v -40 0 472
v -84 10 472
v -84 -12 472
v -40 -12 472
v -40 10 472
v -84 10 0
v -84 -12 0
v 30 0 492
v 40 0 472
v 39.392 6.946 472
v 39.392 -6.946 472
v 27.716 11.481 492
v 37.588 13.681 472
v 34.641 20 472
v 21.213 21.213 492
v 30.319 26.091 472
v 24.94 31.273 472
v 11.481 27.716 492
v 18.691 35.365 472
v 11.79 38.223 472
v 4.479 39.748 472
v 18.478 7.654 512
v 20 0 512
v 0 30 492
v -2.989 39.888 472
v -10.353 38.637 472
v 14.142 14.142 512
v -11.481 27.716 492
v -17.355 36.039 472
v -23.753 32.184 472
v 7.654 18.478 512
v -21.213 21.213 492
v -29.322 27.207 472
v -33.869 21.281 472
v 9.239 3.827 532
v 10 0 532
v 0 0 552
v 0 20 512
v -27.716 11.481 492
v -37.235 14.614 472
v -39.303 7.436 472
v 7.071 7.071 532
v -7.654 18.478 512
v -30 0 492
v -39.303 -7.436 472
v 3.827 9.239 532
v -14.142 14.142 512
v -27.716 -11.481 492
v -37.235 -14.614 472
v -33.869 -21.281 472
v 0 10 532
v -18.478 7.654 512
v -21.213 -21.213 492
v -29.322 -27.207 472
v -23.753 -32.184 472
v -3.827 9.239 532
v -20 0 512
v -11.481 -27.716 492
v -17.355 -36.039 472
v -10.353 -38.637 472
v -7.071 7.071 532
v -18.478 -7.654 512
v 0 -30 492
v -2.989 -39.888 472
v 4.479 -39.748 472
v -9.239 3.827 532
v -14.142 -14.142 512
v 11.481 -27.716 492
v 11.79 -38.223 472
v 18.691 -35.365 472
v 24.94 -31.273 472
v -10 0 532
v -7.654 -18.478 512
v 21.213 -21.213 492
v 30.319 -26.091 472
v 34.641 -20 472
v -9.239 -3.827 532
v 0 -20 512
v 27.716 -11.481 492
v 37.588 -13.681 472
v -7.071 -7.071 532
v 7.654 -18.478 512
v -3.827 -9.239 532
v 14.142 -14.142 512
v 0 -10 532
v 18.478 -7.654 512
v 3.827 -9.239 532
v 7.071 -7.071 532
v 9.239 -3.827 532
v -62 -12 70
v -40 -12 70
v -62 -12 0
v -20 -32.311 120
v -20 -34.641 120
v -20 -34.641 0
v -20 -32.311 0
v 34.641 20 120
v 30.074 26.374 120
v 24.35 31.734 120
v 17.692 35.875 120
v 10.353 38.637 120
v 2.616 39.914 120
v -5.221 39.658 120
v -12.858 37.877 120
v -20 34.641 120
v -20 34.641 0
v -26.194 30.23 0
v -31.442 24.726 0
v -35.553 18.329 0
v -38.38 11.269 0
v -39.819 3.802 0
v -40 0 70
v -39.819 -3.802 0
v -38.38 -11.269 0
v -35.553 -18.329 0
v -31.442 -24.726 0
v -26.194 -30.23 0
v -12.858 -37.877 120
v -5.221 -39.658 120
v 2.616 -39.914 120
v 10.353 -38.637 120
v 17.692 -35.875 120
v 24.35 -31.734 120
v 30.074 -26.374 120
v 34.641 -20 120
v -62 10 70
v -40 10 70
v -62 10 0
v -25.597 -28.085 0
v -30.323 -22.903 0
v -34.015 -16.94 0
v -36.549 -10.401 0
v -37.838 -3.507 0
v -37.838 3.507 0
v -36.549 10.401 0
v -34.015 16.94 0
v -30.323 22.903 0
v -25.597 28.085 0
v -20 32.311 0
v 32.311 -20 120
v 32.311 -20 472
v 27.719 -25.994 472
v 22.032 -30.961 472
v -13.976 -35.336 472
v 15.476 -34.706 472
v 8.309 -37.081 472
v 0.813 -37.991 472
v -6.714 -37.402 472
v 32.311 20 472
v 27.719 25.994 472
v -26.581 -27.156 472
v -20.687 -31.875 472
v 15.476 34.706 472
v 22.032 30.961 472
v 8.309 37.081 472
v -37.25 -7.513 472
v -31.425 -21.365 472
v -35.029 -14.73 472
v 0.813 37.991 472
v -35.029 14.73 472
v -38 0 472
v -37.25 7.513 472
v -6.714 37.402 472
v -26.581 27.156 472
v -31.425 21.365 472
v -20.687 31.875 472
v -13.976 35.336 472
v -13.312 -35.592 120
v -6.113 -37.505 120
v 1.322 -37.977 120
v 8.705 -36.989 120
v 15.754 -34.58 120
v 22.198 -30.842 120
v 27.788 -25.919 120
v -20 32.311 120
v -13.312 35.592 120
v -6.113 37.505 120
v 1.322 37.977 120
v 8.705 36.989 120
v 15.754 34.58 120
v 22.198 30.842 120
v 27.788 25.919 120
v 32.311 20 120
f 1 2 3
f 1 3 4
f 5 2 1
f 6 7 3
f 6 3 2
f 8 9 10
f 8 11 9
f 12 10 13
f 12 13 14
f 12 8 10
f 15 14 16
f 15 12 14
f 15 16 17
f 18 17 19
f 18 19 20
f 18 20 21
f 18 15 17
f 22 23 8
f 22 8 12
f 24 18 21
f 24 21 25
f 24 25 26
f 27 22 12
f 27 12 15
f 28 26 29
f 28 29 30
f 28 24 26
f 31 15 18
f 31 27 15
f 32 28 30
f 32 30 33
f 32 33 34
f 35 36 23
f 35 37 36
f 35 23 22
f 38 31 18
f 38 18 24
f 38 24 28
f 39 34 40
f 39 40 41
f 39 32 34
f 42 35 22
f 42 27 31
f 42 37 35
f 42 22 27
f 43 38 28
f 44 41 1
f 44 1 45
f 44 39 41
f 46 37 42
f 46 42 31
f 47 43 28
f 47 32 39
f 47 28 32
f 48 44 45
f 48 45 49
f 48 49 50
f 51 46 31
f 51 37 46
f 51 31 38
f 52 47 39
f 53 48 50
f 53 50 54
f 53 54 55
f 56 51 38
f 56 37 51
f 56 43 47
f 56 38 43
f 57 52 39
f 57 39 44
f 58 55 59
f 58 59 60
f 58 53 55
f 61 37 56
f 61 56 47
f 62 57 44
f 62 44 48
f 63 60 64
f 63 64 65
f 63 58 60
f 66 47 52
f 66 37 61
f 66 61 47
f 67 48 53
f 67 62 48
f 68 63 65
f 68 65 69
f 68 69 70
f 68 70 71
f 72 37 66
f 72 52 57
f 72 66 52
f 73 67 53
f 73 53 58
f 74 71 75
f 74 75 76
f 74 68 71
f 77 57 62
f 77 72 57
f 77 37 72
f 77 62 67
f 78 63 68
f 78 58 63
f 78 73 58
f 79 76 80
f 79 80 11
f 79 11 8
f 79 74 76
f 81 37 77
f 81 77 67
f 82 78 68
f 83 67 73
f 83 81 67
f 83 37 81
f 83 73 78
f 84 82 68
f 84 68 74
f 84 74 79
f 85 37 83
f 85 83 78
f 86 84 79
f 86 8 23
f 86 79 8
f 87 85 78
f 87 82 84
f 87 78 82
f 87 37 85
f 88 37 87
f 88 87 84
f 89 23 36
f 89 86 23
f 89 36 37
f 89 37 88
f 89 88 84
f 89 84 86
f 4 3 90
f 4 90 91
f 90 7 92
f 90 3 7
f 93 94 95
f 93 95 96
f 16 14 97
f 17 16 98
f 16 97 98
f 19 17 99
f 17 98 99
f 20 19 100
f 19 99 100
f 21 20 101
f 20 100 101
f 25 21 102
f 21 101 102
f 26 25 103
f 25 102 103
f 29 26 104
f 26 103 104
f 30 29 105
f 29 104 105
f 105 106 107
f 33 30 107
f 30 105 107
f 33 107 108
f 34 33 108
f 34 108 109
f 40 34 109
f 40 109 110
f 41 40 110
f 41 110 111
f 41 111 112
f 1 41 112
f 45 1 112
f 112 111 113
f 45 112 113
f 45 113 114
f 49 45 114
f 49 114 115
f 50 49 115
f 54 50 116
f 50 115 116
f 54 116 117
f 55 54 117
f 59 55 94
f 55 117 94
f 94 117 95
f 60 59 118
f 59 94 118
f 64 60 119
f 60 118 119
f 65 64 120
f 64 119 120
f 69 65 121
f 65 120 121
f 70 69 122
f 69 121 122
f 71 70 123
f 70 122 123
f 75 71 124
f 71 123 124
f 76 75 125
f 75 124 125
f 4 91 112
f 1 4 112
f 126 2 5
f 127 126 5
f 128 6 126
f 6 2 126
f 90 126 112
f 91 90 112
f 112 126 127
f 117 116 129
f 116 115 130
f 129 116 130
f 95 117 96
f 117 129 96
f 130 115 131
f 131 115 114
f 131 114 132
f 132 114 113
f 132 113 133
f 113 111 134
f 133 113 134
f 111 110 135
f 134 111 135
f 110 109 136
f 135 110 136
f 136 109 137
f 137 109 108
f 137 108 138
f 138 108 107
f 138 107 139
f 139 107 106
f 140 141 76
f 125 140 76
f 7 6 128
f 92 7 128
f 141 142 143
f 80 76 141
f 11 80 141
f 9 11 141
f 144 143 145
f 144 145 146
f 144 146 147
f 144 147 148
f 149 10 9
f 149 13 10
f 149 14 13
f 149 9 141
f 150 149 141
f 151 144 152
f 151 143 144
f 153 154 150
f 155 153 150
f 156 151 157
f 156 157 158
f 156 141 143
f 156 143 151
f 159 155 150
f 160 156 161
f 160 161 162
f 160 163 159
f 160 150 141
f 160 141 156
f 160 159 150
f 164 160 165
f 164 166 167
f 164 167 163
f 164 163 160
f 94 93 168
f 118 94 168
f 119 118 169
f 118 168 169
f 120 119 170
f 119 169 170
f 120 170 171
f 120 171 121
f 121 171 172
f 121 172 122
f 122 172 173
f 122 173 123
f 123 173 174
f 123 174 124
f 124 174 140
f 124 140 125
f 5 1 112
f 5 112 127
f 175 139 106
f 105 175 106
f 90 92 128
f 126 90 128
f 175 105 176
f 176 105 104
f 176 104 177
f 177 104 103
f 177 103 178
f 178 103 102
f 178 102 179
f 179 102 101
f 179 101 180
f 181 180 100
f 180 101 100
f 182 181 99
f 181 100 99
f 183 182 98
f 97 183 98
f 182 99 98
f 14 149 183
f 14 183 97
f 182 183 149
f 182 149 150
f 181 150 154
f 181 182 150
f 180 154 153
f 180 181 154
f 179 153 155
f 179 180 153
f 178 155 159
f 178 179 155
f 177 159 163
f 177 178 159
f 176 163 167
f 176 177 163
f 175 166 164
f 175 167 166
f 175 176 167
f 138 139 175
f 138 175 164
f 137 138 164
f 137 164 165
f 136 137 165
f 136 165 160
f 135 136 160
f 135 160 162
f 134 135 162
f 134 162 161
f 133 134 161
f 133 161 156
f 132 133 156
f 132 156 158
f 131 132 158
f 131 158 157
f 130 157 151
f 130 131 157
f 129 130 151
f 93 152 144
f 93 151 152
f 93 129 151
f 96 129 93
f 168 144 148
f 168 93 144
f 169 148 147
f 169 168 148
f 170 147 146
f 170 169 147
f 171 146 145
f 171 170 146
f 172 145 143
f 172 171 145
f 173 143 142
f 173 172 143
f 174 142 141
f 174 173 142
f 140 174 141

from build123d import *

# Parameters (mm, degrees)
BOX003_W          = 22
BOX003_H          = 60
BOX003_DEPTH      = 70
BOX002_W          = 44
BOX002_H          = 22
BOX002_DEPTH      = 472
BOX001_W          = 60
BOX001_H          = 40
BOX001_DEPTH      = 472
BOX_W             = 100
BOX_H             = 100
BOX_DEPTH         = 120
CYLINDER001_R     = 38
CYLINDER001_DEPTH = 500
CYLINDER_R        = 40
CYLINDER_DEPTH    = 472


with BuildPart() as rocket_cap:
    # Cone → Cone (revolve)
    with BuildSketch(Plane(origin=(0, 0, 472), x_dir=(1, 0, 0), z_dir=(0, -1, 0))):
        Polygon((0, 0), (40, 0), (0, 80), align=None)
    revolve(axis=Axis((0, 0, 472), (0, 0, 1)))


with BuildPart() as holder_opening:
    # Box003 → Box003 (new body)
    with BuildSketch(Plane(origin=(-62, -30, 0), x_dir=(1, 0, 0), z_dir=(0, 0, 1))):
        with Locations((11, 30)):
            Rectangle(BOX003_W, BOX003_H)
    extrude(amount=BOX003_DEPTH)


with BuildPart() as holder_final:
    # Box002 → Box002 (new body)
    with BuildSketch(Plane(origin=(-84, -12, 0), x_dir=(1, 0, 0), z_dir=(0, 0, 1))):
        with Locations((22, 11)):
            Rectangle(BOX002_W, BOX002_H)
    extrude(amount=BOX002_DEPTH)

    # Cut002: cut holder_opening
    add(holder_opening.part, mode=Mode.SUBTRACT)


with BuildPart() as opening2:
    # Box001 → Box001 (new body)
    with BuildSketch(Plane(origin=(0, -20, 0), x_dir=(1, 0, 0), z_dir=(0, 0, 1))):
        with Locations((30, 20)):
            Rectangle(BOX001_W, BOX001_H)
    extrude(amount=BOX001_DEPTH)


with BuildPart() as opening_final:
    # Box → Box (new body)
    with BuildSketch(Plane(origin=(-20, -50, 0), x_dir=(1, 0, 0), z_dir=(0, 0, 1))):
        with Locations((50, 50)):
            Rectangle(BOX_W, BOX_H)
    extrude(amount=BOX_DEPTH)

    # Fusion: union opening2
    add(opening2.part)


with BuildPart() as rocket_cylinder_inside:
    # Cylinder001 → Cylinder001 (new body)
    with BuildSketch(Plane.XY.offset(-10)):
        Circle(CYLINDER001_R)
    extrude(amount=CYLINDER001_DEPTH)


with BuildPart() as rocket:
    # Cylinder → Cylinder (new body)
    with BuildSketch(Plane.XY):
        Circle(CYLINDER_R)
    extrude(amount=CYLINDER_DEPTH)

    # Cut: cut rocket_cylinder_inside
    add(rocket_cylinder_inside.part, mode=Mode.SUBTRACT)

    # Cut001: cut opening_final
    add(opening_final.part, mode=Mode.SUBTRACT)

    # Fusion001: union rocket_cap, holder_final
    add(rocket_cap.part)
    add(holder_final.part)


solid = rocket.part
